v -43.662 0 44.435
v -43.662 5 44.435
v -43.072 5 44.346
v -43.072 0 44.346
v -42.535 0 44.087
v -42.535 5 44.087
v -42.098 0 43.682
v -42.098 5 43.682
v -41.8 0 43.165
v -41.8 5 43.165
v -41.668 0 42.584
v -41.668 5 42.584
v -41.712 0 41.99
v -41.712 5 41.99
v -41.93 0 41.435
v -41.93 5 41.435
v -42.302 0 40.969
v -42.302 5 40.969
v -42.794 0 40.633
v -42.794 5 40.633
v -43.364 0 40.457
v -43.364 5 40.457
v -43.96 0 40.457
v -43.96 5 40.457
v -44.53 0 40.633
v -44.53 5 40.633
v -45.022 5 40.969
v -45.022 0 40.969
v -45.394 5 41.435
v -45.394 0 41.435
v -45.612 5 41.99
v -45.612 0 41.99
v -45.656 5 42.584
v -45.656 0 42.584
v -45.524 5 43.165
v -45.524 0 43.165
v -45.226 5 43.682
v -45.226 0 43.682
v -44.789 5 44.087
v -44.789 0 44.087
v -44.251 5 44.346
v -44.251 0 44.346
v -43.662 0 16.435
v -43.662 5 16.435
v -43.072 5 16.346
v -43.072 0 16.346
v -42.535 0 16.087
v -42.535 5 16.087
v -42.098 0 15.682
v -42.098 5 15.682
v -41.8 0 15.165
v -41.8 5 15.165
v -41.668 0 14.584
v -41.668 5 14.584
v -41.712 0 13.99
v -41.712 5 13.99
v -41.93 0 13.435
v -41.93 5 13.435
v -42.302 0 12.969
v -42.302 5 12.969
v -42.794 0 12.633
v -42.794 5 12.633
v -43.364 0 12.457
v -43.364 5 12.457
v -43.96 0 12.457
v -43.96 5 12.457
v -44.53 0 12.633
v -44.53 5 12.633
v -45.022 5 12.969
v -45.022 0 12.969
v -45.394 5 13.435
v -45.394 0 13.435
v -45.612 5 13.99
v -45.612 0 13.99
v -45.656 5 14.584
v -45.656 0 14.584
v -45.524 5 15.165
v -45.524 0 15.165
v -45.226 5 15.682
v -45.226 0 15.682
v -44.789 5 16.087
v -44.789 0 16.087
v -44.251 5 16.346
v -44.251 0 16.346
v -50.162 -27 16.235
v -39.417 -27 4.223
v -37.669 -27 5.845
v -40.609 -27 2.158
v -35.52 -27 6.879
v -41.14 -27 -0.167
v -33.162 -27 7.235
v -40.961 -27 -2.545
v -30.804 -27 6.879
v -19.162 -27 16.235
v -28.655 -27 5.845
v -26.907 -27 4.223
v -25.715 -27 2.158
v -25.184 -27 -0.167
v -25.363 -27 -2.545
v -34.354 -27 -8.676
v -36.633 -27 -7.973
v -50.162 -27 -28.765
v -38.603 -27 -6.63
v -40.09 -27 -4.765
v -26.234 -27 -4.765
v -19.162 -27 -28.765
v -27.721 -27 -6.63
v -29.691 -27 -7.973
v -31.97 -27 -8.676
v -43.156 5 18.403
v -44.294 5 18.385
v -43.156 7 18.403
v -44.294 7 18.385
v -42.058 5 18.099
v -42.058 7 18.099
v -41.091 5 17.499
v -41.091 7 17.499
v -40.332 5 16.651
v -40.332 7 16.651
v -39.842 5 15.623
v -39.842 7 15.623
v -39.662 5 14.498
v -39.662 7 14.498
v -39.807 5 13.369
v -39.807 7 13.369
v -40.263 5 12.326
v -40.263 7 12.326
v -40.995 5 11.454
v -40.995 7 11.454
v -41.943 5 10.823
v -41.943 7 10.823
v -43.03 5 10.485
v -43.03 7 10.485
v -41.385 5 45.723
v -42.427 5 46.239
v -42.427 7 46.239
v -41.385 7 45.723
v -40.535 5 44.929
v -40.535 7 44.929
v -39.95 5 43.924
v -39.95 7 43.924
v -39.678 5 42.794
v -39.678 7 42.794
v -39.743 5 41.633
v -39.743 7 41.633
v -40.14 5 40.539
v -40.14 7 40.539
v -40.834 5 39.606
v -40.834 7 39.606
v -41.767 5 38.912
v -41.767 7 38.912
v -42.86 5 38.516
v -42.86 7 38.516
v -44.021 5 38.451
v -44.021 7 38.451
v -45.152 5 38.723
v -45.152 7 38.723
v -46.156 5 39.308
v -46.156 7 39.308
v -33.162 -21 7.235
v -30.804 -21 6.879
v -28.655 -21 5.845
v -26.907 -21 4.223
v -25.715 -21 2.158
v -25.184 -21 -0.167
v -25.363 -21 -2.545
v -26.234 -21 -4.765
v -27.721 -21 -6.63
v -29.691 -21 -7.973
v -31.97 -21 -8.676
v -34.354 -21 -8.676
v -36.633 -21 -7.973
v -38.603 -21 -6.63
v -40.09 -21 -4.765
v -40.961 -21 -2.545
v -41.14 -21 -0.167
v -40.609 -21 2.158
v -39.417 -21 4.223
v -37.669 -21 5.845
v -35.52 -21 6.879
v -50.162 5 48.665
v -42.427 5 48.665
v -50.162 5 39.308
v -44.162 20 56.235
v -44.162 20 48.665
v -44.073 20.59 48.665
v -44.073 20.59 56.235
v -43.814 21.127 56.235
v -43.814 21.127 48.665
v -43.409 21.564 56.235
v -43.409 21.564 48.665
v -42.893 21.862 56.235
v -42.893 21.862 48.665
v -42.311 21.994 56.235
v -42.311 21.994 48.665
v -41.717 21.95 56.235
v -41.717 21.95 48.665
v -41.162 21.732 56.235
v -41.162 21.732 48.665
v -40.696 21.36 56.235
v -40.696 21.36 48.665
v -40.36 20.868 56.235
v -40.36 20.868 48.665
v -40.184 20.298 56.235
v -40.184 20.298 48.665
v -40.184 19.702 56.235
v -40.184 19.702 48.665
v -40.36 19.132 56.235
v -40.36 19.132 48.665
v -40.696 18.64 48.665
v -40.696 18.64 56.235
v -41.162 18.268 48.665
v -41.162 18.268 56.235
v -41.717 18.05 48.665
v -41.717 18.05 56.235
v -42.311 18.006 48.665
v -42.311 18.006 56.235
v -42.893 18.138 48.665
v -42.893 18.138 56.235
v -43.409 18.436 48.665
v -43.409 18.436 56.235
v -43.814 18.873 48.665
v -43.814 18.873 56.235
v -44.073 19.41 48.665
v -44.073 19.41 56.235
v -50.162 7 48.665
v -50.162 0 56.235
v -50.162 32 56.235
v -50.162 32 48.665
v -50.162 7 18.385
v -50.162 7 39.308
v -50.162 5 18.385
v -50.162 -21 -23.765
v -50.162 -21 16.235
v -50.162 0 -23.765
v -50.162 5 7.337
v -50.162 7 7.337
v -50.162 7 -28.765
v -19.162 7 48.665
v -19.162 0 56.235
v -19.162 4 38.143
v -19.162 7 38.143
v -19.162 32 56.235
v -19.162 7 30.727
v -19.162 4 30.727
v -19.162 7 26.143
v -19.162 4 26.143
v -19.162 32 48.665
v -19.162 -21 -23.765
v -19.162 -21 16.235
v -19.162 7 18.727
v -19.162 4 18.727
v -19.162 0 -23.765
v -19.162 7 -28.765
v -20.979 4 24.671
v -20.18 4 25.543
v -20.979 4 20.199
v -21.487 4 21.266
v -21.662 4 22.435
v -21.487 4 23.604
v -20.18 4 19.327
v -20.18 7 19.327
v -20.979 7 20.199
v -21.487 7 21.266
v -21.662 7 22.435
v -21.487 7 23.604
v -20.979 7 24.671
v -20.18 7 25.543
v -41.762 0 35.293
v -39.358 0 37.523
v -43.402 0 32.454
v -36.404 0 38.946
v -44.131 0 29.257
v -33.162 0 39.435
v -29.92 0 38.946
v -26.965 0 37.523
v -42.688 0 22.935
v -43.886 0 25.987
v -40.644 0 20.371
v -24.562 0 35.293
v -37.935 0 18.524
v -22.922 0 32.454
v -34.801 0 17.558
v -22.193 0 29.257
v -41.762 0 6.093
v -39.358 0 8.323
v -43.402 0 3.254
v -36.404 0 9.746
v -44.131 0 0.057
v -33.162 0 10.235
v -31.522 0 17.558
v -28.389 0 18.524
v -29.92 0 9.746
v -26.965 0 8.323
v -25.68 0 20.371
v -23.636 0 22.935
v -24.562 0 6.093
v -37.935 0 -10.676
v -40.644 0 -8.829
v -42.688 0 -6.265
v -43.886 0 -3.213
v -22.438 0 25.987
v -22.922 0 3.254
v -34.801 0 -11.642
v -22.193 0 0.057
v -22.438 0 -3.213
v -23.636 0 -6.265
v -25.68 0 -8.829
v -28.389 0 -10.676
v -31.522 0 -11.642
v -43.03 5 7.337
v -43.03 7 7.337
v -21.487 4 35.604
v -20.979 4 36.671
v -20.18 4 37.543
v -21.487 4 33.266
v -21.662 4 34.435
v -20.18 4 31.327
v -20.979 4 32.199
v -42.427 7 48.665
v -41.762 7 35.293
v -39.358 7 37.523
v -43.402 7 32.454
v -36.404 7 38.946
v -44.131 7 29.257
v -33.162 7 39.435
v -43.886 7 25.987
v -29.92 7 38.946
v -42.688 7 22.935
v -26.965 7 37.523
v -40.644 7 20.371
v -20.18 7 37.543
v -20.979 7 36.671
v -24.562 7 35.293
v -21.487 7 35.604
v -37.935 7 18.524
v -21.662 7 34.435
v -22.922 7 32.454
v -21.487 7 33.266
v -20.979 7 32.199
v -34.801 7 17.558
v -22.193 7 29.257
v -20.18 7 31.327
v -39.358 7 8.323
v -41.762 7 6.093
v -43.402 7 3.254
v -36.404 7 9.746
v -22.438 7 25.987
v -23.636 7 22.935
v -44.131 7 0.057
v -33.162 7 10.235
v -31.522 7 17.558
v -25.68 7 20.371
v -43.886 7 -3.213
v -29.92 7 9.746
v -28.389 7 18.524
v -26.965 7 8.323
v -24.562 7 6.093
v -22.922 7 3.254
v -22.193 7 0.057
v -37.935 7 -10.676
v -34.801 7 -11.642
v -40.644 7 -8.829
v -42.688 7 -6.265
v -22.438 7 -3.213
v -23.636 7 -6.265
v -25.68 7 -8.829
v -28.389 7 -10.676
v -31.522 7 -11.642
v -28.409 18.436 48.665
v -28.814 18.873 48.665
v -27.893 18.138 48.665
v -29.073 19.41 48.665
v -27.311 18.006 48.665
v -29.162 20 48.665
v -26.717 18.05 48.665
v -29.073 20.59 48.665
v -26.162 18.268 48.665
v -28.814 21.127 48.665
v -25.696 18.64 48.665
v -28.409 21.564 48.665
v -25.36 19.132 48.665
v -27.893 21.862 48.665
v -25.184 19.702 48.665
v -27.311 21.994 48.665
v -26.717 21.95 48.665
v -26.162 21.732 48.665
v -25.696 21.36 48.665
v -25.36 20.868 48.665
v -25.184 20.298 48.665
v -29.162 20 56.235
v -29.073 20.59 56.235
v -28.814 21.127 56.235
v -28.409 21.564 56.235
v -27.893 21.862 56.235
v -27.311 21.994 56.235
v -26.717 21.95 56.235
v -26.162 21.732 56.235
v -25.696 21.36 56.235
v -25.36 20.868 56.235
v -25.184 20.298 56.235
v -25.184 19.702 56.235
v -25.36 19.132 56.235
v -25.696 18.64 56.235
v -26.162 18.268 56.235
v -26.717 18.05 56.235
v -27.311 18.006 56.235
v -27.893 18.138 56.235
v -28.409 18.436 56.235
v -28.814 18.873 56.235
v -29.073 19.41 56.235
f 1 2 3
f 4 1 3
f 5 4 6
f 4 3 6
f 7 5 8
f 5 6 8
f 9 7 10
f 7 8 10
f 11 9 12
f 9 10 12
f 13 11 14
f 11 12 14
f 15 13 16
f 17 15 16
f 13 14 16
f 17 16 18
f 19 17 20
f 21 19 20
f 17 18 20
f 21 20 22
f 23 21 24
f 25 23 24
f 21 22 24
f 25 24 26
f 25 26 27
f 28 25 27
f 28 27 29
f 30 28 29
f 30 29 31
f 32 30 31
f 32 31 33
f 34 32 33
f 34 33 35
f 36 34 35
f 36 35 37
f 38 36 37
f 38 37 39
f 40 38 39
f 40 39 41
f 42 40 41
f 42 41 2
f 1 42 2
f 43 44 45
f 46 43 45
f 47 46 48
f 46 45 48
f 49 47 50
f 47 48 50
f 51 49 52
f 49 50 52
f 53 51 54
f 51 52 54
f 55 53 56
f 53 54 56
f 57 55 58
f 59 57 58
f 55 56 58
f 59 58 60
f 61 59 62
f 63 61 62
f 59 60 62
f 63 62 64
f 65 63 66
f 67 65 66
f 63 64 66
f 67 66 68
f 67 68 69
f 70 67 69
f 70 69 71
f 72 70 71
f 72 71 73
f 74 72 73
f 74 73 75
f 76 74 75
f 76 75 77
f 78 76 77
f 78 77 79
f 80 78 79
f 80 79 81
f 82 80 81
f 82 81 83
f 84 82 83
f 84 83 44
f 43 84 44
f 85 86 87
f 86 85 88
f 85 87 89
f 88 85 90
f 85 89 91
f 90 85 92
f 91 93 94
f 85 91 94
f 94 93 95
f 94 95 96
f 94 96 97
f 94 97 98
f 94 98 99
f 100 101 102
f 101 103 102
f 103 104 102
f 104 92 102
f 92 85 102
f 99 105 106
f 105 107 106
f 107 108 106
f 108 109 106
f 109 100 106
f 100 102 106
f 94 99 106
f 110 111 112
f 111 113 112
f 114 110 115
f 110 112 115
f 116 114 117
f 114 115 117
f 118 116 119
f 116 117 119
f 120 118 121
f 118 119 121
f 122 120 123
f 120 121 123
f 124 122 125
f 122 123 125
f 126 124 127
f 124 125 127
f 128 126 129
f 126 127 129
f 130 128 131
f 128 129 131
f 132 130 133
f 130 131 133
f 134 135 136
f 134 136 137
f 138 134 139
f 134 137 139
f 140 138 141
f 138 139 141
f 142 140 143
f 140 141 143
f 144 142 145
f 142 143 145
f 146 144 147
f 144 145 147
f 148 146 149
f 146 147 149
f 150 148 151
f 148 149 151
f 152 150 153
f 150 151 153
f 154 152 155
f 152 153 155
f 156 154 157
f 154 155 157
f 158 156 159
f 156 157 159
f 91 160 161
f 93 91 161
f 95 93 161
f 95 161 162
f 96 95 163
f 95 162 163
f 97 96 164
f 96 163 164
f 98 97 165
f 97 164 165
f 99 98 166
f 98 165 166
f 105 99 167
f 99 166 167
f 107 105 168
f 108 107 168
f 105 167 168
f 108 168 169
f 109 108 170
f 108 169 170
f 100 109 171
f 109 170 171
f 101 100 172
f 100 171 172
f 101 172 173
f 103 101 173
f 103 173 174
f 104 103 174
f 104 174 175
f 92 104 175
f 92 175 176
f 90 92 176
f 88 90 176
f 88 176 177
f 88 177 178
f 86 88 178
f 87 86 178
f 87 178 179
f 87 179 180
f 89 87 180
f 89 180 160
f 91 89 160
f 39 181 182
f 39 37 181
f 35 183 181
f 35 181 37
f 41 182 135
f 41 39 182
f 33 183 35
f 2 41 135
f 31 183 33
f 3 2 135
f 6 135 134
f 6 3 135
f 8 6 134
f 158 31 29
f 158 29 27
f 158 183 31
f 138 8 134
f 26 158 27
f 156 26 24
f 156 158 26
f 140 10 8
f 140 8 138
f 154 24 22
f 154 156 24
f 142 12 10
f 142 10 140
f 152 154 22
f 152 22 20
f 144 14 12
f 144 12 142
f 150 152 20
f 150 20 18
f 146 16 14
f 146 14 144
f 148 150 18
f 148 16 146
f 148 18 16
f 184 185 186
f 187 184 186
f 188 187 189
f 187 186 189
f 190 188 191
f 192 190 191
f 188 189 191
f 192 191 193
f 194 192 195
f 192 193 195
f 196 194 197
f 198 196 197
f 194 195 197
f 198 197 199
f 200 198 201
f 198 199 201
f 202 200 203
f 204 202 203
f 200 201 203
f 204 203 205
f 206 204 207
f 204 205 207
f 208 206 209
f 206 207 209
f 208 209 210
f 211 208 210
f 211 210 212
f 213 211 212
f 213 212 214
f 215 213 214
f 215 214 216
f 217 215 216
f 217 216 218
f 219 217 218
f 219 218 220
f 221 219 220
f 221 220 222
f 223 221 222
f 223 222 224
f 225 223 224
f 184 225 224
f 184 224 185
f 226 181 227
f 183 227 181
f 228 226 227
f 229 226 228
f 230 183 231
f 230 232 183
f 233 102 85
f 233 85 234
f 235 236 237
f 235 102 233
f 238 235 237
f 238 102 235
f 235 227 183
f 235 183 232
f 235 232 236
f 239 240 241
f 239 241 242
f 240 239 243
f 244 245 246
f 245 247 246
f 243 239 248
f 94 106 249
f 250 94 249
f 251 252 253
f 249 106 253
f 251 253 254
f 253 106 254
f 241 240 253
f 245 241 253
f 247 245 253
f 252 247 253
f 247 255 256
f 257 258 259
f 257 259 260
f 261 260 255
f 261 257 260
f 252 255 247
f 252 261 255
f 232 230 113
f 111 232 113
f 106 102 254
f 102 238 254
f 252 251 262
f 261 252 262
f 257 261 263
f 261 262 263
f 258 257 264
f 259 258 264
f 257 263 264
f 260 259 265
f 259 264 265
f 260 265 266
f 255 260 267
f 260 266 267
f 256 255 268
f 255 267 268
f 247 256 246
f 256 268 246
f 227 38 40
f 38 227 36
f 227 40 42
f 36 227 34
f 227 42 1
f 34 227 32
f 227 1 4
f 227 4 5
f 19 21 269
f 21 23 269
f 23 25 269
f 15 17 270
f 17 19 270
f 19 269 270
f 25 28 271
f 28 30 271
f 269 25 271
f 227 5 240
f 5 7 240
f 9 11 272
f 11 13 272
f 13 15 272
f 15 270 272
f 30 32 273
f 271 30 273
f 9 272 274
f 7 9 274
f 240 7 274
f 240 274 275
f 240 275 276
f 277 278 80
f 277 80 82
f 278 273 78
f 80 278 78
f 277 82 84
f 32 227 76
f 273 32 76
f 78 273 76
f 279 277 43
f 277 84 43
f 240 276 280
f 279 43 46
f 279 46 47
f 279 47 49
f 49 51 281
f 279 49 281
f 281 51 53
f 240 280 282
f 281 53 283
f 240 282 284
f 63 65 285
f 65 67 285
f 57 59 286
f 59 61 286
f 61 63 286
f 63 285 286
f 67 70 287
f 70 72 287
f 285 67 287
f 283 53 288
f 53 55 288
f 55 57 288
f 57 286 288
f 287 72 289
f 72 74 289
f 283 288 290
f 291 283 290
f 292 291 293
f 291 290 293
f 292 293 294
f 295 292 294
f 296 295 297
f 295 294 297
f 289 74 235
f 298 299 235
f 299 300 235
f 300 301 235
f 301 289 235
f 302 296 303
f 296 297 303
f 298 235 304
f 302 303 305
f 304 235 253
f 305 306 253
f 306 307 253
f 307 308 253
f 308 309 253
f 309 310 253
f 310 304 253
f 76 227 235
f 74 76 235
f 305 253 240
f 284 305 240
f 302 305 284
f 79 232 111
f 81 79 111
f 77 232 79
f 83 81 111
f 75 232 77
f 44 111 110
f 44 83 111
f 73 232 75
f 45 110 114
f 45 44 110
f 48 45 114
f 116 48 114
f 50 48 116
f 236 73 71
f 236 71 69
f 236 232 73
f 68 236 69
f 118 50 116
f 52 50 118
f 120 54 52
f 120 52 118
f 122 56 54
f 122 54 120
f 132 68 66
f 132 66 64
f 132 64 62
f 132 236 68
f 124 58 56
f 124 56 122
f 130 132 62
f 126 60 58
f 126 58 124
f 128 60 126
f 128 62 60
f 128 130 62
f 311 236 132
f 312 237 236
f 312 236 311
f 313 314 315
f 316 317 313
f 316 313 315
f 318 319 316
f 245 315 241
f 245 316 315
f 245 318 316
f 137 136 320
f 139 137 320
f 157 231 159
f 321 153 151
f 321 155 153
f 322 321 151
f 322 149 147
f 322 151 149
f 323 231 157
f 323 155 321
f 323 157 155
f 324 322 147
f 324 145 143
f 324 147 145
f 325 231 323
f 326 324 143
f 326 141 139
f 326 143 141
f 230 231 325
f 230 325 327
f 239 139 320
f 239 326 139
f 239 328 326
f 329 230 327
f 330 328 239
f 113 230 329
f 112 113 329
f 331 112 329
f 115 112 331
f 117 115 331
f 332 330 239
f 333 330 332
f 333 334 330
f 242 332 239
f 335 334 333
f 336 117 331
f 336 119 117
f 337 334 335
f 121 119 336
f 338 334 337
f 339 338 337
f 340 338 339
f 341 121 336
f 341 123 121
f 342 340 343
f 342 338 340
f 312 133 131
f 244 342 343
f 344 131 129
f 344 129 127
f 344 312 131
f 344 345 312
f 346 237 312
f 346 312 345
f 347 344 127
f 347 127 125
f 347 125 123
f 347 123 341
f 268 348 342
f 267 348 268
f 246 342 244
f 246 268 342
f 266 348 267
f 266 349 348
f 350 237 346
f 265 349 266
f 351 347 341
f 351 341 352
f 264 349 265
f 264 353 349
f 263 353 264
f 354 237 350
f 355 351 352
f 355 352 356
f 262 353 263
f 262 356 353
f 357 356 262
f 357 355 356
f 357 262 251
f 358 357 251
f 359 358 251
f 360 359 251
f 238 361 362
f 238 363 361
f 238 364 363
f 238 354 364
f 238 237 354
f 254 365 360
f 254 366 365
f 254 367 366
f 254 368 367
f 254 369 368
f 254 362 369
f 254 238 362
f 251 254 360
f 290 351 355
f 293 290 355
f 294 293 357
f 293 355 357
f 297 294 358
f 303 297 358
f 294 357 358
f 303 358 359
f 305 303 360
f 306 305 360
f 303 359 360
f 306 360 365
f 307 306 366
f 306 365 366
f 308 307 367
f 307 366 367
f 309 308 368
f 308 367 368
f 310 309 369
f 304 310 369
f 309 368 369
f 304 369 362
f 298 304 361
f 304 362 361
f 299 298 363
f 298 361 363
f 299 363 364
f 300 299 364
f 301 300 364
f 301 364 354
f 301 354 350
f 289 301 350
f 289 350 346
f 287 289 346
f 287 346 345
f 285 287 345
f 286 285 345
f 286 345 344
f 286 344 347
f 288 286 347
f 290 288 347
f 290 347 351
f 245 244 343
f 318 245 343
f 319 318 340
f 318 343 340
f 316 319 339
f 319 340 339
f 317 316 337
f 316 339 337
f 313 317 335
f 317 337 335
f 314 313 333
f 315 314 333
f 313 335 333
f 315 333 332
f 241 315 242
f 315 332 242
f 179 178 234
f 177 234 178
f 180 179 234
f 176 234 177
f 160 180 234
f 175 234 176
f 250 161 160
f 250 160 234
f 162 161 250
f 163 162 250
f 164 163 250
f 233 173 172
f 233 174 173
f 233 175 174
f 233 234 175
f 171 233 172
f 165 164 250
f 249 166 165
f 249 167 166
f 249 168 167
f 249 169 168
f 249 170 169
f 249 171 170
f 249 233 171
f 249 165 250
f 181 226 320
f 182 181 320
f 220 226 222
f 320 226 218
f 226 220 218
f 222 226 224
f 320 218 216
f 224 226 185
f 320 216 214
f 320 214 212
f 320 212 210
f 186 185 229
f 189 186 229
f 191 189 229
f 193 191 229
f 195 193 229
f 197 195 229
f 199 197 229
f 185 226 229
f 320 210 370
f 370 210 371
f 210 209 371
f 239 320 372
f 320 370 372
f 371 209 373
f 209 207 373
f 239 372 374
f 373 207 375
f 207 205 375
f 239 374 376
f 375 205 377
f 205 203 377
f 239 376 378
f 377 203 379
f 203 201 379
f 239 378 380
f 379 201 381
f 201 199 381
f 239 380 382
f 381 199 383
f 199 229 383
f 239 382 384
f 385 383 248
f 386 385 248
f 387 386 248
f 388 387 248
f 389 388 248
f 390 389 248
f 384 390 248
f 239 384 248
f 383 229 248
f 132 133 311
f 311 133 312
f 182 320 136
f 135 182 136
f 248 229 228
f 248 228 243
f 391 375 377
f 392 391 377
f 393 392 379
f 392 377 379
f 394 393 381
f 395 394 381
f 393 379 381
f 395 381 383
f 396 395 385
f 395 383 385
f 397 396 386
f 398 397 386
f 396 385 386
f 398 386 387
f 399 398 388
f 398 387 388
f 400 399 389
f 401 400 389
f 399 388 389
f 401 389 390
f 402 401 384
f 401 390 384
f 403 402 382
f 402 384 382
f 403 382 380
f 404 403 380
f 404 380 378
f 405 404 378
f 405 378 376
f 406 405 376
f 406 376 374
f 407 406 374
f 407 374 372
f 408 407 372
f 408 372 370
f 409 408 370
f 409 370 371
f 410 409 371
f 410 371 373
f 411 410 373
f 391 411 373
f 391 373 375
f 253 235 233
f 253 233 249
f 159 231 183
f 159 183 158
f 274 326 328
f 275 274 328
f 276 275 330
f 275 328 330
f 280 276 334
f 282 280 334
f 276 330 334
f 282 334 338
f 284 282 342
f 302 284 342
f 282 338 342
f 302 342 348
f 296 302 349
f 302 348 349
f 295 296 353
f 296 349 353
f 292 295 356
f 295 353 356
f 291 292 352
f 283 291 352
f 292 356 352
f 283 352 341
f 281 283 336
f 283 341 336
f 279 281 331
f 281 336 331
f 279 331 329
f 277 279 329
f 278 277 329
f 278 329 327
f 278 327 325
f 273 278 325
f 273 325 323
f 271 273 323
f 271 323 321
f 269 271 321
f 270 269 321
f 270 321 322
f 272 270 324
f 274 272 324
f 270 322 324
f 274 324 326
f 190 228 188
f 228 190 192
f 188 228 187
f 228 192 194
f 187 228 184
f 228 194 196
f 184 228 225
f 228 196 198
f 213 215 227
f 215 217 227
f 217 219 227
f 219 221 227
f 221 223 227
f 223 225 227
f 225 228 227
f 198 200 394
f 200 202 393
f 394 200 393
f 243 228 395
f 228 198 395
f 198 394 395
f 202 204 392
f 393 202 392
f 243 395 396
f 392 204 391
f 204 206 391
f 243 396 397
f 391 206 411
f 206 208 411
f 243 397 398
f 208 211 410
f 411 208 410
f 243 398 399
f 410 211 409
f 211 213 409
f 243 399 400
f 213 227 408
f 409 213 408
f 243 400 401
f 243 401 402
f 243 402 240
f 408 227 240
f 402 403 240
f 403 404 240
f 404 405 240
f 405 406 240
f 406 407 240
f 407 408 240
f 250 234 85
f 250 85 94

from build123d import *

# Parameters (mm, degrees)
SKETCH1_W           = 31
SKETCH1_H           = 85
BOSS_EXTRUDE1_DEPTH = 7
SKETCH2_R           = 11
CUT_EXTRUDE1_DEPTH  = 100
SKETCH3_R           = 11
CUT_EXTRUDE2_DEPTH  = 7
SKETCH4_W           = 31
SKETCH4_H           = 7.57
BOSS_EXTRUDE3_DEPTH = 25
SKETCH5_R           = 2
CUT_EXTRUDE3_DEPTH  = 14
SKETCH6_R           = 2
CUT_EXTRUDE4_DEPTH  = 14
SKETCH10_W          = 31
SKETCH10_H          = 5
BOSS_EXTRUDE4_DEPTH = 27
SKETCH11_W          = 31
SKETCH11_H          = 6
BOSS_EXTRUDE5_DEPTH = 40
SKETCH9_R           = 8
CUT_EXTRUDE5_DEPTH  = 40
SKETCH13_R          = 4
CUT_EXTRUDE6_DEPTH  = 2
SKETCH15_W          = 7.132198052
SKETCH15_H          = 11.047195358
SKETCH15_W_2        = 7.735251328
SKETCH15_H_2        = 9.356853031
CUT_EXTRUDE9_DEPTH  = 2
CUT_EXTRUDE10_DEPTH = 3


with BuildPart() as part:
    # Sketch1 → Boss-Extrude1 (new body)
    with BuildSketch(Plane(origin=(0, 0, 0), x_dir=(1, 0, 0), z_dir=(0, 1, 0))):
        with Locations((-34.66194332, -13.734817814)):
            Rectangle(SKETCH1_W, SKETCH1_H)
    extrude(amount=BOSS_EXTRUDE1_DEPTH)

    # Sketch2 → Cut-Extrude1 (cut)
    with BuildSketch(Plane(origin=(0, 7, 0), x_dir=(1, 0, 0), z_dir=(0, 1, 0))):
        with Locations(Location((-33.16194332, 0.765182186, 0), (0, 0, 270))):
            Circle(SKETCH2_R)
    extrude(amount=-CUT_EXTRUDE1_DEPTH, mode=Mode.SUBTRACT)

    # Sketch3 → Cut-Extrude2 (cut)
    with BuildSketch(Plane(origin=(0, 7, 0), x_dir=(1, 0, 0), z_dir=(0, 1, 0))):
        with Locations(Location((-33.16194332, -28.434817814, 0), (0, 0, 270))):
            Circle(SKETCH3_R)
    extrude(amount=-CUT_EXTRUDE2_DEPTH, mode=Mode.SUBTRACT)

    # Sketch4 → Boss-Extrude3 (add)
    with BuildSketch(Plane(origin=(0, 7, 0), x_dir=(1, 0, 0), z_dir=(0, 1, 0))):
        with Locations((-34.66194332, -52.449817814)):
            Rectangle(SKETCH4_W, SKETCH4_H)
    extrude(amount=BOSS_EXTRUDE3_DEPTH)

    # Sketch5 → Cut-Extrude3 (cut)
    with BuildSketch(Plane(origin=(0, 0, 48.664817814), x_dir=(-1, 0, 0), z_dir=(0, 0, -1))):
        with Locations((42.16194332, 20)):
            Circle(SKETCH5_R)
        with Locations((27.16194332, 20)):
            Circle(SKETCH5_R)
    extrude(amount=-CUT_EXTRUDE3_DEPTH, mode=Mode.SUBTRACT)

    # Sketch6 → Cut-Extrude4 (cut)
    with BuildSketch(Plane(origin=(0, 7, 0), x_dir=(1, 0, 0), z_dir=(0, 1, 0))):
        with Locations(Location((-43.66194332, -14.434817814, 0), (0, 0, 270))):
            Circle(SKETCH6_R)
        with Locations(Location((-43.66194332, -42.434817814, 0), (0, 0, 270))):
            Circle(SKETCH6_R)
    extrude(amount=-CUT_EXTRUDE4_DEPTH, mode=Mode.SUBTRACT)

    # Sketch10 → Boss-Extrude4 (add)
    with BuildSketch(Plane.XZ):
        with Locations((-34.66194332, -26.265182186)):
            Rectangle(SKETCH10_W, SKETCH10_H)
    extrude(amount=BOSS_EXTRUDE4_DEPTH)

    # Sketch11 → Boss-Extrude5 (add)
    with BuildSketch(Plane.XY.offset(-23.765182186)):
        with Locations((-34.66194332, -24)):
            Rectangle(SKETCH11_W, SKETCH11_H)
    extrude(amount=BOSS_EXTRUDE5_DEPTH)

    # Sketch9 → Cut-Extrude5 (cut)
    with BuildSketch(Plane(origin=(0, 7, 0), x_dir=(1, 0, 0), z_dir=(0, 1, 0))):
        with Locations(Location((-33.16194332, 0.765182186, 0), (0, 0, 270))):
            Circle(SKETCH9_R)
    extrude(amount=-CUT_EXTRUDE5_DEPTH, mode=Mode.SUBTRACT)

    # Sketch13 → Cut-Extrude6 (cut)
    with BuildSketch(Plane(origin=(0, 7, 0), x_dir=(1, 0, 0), z_dir=(0, 1, 0))):
        with Locations(Location((-43.66194332, -14.434817814, 0), (0, 0, 270))):
            Circle(SKETCH13_R)
        with Locations(Location((-43.66194332, -42.434817814, 0), (0, 0, 270))):
            Circle(SKETCH13_R)
    extrude(amount=-CUT_EXTRUDE6_DEPTH, mode=Mode.SUBTRACT)

    # Sketch15 → Cut-Extrude9 (cut)
    with BuildSketch(Plane(origin=(0, 7, 0), x_dir=(1, 0, 0), z_dir=(0, 1, 0))):
        with Locations((-46.595844294, -12.860944888)):
            Rectangle(SKETCH15_W, SKETCH15_H)
        with Locations((-46.294317656, -43.986391299)):
            Rectangle(SKETCH15_W_2, SKETCH15_H_2)
    extrude(amount=-CUT_EXTRUDE9_DEPTH, mode=Mode.SUBTRACT)

    # Sketch17 → Cut-Extrude10 (cut)
    with BuildSketch(Plane(origin=(0, 7, 0), x_dir=(1, 0, 0), z_dir=(0, 1, 0))):
        with BuildLine():
            ThreePointArc((-19.16194332, -18.72671857), (-21.66194332, -22.434817814), (-19.16194332, -26.142917057))
            Line((-19.16194332, -26.142917057), (-19.16194332, -18.72671857))
        make_face()
        with BuildLine():
            Line((-19.16194332, -38.142917057), (-19.16194332, -30.72671857))
            ThreePointArc((-19.16194332, -30.72671857), (-21.66194332, -34.434817814), (-19.16194332, -38.142917057))
        make_face()
    extrude(amount=-CUT_EXTRUDE10_DEPTH, mode=Mode.SUBTRACT)


solid = part.part
